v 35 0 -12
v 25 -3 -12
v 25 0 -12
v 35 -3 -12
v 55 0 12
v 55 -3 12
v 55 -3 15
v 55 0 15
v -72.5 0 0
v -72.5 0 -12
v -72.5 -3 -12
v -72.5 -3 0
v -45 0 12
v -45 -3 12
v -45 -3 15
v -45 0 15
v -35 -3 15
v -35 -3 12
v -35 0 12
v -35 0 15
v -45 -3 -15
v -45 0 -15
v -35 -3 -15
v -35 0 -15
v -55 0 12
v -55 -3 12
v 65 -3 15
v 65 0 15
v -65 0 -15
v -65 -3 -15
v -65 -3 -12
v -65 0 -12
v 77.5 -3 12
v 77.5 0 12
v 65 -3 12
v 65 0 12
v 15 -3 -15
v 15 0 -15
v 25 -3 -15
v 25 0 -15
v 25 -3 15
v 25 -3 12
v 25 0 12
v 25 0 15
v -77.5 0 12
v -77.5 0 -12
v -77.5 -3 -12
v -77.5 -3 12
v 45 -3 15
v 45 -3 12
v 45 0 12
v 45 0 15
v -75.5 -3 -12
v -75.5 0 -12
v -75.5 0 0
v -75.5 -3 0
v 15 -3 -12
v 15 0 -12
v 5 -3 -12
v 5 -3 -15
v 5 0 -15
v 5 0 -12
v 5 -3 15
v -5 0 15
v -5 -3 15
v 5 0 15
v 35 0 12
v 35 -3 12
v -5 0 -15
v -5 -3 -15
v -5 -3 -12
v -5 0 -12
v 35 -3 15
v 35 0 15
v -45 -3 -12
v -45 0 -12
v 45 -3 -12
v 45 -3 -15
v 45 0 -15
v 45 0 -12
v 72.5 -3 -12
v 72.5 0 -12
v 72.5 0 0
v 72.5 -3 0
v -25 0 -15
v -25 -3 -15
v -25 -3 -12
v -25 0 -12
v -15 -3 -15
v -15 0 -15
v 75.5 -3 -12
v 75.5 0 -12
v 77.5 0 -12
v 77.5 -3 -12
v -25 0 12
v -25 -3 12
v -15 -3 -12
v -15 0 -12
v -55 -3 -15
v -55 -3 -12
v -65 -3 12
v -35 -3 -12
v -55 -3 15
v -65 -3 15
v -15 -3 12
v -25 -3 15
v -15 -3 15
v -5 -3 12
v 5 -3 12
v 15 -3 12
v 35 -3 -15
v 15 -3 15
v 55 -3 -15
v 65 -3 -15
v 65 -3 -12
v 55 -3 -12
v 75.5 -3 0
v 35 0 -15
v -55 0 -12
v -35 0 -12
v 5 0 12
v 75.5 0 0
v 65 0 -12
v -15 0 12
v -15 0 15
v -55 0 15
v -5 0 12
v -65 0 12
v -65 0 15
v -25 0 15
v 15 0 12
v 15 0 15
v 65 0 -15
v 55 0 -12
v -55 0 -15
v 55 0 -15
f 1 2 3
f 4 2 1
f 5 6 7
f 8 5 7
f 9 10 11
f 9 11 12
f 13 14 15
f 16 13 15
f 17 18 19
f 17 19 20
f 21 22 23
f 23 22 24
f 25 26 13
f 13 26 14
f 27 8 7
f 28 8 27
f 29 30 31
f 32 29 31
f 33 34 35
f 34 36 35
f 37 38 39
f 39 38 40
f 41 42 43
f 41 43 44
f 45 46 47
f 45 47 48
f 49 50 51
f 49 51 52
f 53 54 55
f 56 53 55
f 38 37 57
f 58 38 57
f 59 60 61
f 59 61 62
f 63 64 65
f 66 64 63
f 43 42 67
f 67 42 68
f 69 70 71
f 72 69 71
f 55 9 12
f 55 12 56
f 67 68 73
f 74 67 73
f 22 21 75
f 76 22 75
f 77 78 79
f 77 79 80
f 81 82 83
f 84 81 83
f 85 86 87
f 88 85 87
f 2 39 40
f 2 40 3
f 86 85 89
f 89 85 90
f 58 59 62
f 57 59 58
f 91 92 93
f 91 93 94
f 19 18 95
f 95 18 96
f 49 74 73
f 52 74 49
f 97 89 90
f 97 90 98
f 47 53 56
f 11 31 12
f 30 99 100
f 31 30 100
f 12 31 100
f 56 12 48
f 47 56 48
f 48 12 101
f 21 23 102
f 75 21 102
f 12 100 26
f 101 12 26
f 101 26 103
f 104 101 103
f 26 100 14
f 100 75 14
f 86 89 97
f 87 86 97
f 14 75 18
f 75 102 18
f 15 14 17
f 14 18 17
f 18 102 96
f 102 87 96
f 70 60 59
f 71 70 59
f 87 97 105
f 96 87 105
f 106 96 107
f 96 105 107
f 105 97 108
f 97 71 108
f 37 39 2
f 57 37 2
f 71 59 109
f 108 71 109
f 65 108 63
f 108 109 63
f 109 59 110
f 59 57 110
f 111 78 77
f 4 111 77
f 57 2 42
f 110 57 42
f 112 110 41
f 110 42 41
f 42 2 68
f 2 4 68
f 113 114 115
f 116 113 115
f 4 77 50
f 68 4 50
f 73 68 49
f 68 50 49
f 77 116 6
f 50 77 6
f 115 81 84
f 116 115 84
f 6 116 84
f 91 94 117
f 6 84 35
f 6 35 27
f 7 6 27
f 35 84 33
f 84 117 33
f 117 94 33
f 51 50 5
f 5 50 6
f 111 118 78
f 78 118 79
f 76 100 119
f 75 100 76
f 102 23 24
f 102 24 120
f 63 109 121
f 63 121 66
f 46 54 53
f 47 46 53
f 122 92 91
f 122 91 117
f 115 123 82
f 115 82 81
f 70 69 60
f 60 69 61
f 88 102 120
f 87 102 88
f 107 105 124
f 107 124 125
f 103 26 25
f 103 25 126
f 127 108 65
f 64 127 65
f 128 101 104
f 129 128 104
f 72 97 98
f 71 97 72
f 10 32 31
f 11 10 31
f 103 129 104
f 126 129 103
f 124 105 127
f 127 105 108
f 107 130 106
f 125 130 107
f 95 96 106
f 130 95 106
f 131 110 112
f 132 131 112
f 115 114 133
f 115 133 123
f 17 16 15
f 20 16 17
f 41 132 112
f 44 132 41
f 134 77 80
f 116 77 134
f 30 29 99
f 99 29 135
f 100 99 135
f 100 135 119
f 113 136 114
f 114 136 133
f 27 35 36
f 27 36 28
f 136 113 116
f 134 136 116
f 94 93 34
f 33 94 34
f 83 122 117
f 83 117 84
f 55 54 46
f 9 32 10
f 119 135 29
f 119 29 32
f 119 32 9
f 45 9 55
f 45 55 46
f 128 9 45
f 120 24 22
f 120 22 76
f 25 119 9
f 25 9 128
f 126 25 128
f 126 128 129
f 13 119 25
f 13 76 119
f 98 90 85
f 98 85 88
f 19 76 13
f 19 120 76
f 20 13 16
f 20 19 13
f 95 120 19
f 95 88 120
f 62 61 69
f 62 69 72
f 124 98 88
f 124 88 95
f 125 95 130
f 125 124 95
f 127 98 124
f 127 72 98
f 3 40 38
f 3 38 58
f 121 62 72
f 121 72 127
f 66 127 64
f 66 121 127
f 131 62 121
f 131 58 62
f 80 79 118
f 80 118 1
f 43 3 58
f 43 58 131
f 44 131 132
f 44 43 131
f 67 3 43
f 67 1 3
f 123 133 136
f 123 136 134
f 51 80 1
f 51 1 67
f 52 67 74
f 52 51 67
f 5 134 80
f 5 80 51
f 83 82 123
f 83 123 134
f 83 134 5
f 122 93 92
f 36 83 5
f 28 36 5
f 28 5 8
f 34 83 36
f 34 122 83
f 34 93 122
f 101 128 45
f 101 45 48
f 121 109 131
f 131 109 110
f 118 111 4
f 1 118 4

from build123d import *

# Parameters (mm, degrees)
F0_W     = 145
F0_H     = 30
F1_DEPTH = 3
F2_W     = 10
F2_H     = 3
F3_DEPTH = 25
F4_DEPTH = 5
F5_DEPTH = 5
F6_W     = 3
F6_H     = 12
F7_DEPTH = 25


with BuildPart() as f1:
    # F0 (on Front) → F1 (new body)
    with BuildSketch(Plane.XZ):
        Rectangle(F0_W, F0_H)
    extrude(amount=F1_DEPTH)

    # F2 (on face) → F3 (cut)
    with BuildSketch(Plane.XZ.offset(3)):
        with Locations((-70, -13.5)):
            Rectangle(F2_W, F2_H)
        with Locations((-70, 13.5)):
            Rectangle(F2_W, F2_H)
        with Locations((-50, -13.5)):
            Rectangle(F2_W, F2_H)
        with Locations((-50, 13.5)):
            Rectangle(F2_W, F2_H)
        with Locations((-30, -13.5)):
            Rectangle(F2_W, F2_H)
        with Locations((-30, 13.5)):
            Rectangle(F2_W, F2_H)
        with Locations((-10, -13.5)):
            Rectangle(F2_W, F2_H)
        with Locations((-10, 13.5)):
            Rectangle(F2_W, F2_H)
        with Locations((10, -13.5)):
            Rectangle(F2_W, F2_H)
        with Locations((10, 13.5)):
            Rectangle(F2_W, F2_H)
        with Locations((30, -13.5)):
            Rectangle(F2_W, F2_H)
        with Locations((30, 13.5)):
            Rectangle(F2_W, F2_H)
        with Locations((50, -13.5)):
            Rectangle(F2_W, F2_H)
        with Locations((50, 13.5)):
            Rectangle(F2_W, F2_H)
        with Locations((70, -13.5)):
            Rectangle(F2_W, F2_H)
        with Locations((70, 13.5)):
            Rectangle(F2_W, F2_H)
    extrude(amount=-F3_DEPTH, mode=Mode.SUBTRACT)

    # F4 (add): faces of the model
    f4_faces = [f1.faces().sort_by_distance(p)[0] for p in [
        (72.5, -1.5, 0),
        (-72.5, -1.5, 0),
    ]]
    extrude(f4_faces, amount=F4_DEPTH, dir=(1, 0, 0))

    # F5 (add): a face of the model
    f5_faces = [f1.faces().sort_by_distance(p)[0] for p in [
        (-72.5, -1.5, 0),
    ]]
    extrude(f5_faces, amount=F5_DEPTH)

    # F6 (on face) → F7 (cut)
    with BuildSketch(Plane(origin=(0, 0, 0), x_dir=(-1, 0, 0), z_dir=(0, 1, 0))):
        with Locations((-74, -6)):
            Rectangle(F6_W, F6_H)
        with Locations((74, -6)):
            Rectangle(F6_W, F6_H)
    extrude(amount=-F7_DEPTH, mode=Mode.SUBTRACT)


solid = f1.part
